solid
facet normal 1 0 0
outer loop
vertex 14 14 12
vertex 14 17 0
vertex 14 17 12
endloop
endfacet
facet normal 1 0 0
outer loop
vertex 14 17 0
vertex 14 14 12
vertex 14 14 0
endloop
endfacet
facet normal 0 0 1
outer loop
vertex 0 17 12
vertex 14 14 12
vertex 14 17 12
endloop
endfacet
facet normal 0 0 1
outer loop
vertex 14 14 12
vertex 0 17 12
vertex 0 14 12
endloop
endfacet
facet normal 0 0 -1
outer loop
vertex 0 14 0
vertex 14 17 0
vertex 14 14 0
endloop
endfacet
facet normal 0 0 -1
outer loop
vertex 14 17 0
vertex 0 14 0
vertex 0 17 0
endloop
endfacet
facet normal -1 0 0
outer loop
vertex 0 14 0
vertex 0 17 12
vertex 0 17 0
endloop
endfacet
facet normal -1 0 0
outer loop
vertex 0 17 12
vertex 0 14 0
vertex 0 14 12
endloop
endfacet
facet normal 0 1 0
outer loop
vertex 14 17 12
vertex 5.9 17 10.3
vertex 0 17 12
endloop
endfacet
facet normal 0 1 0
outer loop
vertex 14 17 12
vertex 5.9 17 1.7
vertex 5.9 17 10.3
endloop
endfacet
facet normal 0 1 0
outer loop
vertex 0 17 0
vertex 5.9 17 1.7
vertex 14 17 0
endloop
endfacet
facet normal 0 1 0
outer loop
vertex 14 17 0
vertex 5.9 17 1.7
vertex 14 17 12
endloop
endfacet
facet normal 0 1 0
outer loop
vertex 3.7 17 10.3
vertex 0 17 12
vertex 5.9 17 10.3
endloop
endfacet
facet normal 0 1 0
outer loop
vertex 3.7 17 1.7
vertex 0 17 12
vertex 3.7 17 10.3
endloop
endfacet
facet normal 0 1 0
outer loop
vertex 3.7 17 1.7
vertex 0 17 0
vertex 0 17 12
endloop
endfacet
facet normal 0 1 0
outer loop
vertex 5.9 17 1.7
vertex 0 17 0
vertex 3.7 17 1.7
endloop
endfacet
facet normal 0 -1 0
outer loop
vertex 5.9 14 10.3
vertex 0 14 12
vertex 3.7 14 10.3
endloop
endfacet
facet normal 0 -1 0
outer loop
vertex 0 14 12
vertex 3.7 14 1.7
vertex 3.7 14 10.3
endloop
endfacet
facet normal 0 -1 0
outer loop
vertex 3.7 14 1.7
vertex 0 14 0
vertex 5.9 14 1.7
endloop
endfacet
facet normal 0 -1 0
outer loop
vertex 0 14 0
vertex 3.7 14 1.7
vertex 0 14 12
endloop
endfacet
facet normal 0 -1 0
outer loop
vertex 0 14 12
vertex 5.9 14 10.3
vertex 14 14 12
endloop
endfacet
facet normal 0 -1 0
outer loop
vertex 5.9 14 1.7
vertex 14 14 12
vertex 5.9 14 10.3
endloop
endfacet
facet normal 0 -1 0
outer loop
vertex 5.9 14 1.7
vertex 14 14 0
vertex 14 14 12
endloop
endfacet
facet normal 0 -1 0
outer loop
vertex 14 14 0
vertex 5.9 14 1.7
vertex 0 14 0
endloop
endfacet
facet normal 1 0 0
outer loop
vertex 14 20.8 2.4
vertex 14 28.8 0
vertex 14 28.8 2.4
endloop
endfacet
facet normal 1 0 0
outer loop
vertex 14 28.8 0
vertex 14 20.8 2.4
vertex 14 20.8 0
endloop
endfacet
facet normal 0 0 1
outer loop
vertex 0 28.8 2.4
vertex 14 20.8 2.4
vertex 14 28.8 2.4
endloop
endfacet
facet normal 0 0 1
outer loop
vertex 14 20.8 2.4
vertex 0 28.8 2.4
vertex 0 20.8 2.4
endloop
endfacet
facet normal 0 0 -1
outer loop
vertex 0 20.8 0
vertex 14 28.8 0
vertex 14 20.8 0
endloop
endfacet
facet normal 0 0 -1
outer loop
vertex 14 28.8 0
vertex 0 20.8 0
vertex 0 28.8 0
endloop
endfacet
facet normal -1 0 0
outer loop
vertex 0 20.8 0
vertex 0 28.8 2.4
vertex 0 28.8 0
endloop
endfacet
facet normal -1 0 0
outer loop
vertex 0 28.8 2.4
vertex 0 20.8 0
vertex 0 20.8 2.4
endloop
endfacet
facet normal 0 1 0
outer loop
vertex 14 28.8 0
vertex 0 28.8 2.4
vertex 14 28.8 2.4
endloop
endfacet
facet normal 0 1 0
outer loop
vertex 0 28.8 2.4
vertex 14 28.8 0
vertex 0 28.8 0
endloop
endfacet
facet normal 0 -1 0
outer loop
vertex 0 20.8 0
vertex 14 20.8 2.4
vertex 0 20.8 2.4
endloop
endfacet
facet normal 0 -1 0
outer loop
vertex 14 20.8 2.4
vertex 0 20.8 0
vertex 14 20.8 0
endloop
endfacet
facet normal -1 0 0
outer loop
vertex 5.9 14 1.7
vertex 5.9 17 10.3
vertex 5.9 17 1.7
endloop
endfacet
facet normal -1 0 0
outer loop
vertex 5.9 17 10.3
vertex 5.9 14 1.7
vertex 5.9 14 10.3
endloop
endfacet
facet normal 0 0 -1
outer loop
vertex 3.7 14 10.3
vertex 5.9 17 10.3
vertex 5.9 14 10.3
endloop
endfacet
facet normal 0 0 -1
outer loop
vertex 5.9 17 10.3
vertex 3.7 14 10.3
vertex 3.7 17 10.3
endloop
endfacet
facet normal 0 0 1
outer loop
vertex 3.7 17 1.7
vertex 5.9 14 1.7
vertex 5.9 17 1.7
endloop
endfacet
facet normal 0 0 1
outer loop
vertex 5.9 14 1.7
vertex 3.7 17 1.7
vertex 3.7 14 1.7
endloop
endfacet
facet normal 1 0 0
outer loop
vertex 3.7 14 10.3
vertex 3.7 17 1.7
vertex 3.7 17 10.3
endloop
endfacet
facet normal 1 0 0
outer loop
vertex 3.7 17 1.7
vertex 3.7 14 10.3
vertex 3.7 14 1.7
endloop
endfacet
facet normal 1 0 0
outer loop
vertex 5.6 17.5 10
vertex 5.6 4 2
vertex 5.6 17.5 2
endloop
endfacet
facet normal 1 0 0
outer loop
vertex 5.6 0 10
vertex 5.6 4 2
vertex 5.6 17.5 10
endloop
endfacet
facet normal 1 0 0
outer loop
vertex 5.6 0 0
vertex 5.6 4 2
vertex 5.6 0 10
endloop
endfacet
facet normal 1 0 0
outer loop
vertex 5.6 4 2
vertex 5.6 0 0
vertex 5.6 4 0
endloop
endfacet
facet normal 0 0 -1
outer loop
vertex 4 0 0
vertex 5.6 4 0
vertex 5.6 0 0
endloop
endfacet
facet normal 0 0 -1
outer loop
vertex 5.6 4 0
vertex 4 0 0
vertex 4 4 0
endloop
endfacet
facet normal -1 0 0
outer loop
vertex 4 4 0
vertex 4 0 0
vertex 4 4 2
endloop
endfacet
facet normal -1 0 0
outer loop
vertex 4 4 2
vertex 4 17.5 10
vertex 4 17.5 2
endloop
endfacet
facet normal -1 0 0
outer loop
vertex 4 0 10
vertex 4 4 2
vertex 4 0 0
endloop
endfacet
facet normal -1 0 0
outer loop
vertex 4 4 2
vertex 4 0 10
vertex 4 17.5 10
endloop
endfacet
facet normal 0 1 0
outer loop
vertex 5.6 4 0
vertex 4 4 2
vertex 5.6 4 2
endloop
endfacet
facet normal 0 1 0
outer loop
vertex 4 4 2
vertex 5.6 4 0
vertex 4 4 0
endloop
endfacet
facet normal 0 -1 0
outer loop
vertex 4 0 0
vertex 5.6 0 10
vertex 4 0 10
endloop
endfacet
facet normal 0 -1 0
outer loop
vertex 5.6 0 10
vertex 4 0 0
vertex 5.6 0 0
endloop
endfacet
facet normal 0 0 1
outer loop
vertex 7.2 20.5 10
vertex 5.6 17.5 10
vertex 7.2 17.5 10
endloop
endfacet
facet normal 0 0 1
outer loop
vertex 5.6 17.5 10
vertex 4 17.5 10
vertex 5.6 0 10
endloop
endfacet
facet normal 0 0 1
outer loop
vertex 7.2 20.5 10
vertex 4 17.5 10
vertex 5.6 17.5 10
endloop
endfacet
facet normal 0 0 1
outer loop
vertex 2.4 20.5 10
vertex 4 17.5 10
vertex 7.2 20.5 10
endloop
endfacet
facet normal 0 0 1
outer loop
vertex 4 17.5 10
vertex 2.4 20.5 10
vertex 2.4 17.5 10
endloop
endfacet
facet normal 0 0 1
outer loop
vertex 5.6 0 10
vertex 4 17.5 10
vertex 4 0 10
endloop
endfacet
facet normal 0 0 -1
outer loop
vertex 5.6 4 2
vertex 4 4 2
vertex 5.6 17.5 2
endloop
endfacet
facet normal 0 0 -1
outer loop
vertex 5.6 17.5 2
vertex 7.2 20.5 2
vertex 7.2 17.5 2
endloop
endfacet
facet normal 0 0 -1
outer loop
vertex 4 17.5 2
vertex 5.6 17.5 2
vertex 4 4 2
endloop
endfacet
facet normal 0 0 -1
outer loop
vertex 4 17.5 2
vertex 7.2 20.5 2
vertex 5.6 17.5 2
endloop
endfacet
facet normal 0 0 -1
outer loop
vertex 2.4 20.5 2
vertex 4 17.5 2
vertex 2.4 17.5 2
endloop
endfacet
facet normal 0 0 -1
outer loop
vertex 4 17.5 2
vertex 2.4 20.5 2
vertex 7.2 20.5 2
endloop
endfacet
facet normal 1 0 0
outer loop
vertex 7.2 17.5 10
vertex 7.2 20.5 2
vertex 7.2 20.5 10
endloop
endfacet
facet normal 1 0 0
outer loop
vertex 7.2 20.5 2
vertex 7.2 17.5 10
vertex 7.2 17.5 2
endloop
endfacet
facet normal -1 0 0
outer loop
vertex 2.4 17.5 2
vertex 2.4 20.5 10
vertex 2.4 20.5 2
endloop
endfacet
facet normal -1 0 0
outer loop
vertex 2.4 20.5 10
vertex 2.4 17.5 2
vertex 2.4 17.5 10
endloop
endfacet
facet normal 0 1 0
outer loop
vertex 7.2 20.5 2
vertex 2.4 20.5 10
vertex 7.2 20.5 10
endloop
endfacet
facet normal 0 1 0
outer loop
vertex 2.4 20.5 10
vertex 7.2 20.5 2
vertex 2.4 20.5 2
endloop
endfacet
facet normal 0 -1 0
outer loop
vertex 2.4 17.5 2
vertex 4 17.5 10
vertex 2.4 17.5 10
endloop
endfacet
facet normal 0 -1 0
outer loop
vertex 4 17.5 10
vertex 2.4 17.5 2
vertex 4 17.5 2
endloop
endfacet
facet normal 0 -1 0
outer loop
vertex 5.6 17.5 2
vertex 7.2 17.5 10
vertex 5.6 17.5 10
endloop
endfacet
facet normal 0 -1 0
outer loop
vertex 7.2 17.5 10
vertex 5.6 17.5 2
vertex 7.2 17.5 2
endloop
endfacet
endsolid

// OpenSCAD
// Fixture: print-in-place snap-fit clip (mm)
// Target: Bambu Lab P2S, 0.4 mm nozzle
// snap / print-in-place
// radial_mm = 0.3  (bore_d = pin_d + 0.6)
// axial_mm = 0.5   min_pin_mm = 4
$fn = 48;
radial_mm = 0.3;
axial_mm = 0.5;
beam_t = 1.6;
beam_h = 8;
beam_l = 20;
overhang = 1.6;
window_w = 2.2;
window_h = 8.6;

module catch_body() {
  difference() {
    union() {
      translate([0, 14, 0])
        cube([14, 3, 12]);
      // Foot behind the head so it cannot fuse to the beam.
      translate([0, 20.8, 0])
        cube([14, 8, 2.4]);
    }
    translate([3.7, 13.6, 1.7])
      cube([window_w, 3.8, window_h]);
  }
}

module snap_hook() {
  translate([0, 0, 0]) {
    translate([4, 0, 0])
      cube([beam_t, 4, 2.4]);
    translate([4, 0, 2])
      cube([beam_t, beam_l, beam_h]);
    translate([2.4, 17.5, 2])
      cube([4.8, 3, beam_h]);
  }
}

// Separate solids — do not union. Hook flexes in X (XY plane).
catch_body();
snap_hook();
